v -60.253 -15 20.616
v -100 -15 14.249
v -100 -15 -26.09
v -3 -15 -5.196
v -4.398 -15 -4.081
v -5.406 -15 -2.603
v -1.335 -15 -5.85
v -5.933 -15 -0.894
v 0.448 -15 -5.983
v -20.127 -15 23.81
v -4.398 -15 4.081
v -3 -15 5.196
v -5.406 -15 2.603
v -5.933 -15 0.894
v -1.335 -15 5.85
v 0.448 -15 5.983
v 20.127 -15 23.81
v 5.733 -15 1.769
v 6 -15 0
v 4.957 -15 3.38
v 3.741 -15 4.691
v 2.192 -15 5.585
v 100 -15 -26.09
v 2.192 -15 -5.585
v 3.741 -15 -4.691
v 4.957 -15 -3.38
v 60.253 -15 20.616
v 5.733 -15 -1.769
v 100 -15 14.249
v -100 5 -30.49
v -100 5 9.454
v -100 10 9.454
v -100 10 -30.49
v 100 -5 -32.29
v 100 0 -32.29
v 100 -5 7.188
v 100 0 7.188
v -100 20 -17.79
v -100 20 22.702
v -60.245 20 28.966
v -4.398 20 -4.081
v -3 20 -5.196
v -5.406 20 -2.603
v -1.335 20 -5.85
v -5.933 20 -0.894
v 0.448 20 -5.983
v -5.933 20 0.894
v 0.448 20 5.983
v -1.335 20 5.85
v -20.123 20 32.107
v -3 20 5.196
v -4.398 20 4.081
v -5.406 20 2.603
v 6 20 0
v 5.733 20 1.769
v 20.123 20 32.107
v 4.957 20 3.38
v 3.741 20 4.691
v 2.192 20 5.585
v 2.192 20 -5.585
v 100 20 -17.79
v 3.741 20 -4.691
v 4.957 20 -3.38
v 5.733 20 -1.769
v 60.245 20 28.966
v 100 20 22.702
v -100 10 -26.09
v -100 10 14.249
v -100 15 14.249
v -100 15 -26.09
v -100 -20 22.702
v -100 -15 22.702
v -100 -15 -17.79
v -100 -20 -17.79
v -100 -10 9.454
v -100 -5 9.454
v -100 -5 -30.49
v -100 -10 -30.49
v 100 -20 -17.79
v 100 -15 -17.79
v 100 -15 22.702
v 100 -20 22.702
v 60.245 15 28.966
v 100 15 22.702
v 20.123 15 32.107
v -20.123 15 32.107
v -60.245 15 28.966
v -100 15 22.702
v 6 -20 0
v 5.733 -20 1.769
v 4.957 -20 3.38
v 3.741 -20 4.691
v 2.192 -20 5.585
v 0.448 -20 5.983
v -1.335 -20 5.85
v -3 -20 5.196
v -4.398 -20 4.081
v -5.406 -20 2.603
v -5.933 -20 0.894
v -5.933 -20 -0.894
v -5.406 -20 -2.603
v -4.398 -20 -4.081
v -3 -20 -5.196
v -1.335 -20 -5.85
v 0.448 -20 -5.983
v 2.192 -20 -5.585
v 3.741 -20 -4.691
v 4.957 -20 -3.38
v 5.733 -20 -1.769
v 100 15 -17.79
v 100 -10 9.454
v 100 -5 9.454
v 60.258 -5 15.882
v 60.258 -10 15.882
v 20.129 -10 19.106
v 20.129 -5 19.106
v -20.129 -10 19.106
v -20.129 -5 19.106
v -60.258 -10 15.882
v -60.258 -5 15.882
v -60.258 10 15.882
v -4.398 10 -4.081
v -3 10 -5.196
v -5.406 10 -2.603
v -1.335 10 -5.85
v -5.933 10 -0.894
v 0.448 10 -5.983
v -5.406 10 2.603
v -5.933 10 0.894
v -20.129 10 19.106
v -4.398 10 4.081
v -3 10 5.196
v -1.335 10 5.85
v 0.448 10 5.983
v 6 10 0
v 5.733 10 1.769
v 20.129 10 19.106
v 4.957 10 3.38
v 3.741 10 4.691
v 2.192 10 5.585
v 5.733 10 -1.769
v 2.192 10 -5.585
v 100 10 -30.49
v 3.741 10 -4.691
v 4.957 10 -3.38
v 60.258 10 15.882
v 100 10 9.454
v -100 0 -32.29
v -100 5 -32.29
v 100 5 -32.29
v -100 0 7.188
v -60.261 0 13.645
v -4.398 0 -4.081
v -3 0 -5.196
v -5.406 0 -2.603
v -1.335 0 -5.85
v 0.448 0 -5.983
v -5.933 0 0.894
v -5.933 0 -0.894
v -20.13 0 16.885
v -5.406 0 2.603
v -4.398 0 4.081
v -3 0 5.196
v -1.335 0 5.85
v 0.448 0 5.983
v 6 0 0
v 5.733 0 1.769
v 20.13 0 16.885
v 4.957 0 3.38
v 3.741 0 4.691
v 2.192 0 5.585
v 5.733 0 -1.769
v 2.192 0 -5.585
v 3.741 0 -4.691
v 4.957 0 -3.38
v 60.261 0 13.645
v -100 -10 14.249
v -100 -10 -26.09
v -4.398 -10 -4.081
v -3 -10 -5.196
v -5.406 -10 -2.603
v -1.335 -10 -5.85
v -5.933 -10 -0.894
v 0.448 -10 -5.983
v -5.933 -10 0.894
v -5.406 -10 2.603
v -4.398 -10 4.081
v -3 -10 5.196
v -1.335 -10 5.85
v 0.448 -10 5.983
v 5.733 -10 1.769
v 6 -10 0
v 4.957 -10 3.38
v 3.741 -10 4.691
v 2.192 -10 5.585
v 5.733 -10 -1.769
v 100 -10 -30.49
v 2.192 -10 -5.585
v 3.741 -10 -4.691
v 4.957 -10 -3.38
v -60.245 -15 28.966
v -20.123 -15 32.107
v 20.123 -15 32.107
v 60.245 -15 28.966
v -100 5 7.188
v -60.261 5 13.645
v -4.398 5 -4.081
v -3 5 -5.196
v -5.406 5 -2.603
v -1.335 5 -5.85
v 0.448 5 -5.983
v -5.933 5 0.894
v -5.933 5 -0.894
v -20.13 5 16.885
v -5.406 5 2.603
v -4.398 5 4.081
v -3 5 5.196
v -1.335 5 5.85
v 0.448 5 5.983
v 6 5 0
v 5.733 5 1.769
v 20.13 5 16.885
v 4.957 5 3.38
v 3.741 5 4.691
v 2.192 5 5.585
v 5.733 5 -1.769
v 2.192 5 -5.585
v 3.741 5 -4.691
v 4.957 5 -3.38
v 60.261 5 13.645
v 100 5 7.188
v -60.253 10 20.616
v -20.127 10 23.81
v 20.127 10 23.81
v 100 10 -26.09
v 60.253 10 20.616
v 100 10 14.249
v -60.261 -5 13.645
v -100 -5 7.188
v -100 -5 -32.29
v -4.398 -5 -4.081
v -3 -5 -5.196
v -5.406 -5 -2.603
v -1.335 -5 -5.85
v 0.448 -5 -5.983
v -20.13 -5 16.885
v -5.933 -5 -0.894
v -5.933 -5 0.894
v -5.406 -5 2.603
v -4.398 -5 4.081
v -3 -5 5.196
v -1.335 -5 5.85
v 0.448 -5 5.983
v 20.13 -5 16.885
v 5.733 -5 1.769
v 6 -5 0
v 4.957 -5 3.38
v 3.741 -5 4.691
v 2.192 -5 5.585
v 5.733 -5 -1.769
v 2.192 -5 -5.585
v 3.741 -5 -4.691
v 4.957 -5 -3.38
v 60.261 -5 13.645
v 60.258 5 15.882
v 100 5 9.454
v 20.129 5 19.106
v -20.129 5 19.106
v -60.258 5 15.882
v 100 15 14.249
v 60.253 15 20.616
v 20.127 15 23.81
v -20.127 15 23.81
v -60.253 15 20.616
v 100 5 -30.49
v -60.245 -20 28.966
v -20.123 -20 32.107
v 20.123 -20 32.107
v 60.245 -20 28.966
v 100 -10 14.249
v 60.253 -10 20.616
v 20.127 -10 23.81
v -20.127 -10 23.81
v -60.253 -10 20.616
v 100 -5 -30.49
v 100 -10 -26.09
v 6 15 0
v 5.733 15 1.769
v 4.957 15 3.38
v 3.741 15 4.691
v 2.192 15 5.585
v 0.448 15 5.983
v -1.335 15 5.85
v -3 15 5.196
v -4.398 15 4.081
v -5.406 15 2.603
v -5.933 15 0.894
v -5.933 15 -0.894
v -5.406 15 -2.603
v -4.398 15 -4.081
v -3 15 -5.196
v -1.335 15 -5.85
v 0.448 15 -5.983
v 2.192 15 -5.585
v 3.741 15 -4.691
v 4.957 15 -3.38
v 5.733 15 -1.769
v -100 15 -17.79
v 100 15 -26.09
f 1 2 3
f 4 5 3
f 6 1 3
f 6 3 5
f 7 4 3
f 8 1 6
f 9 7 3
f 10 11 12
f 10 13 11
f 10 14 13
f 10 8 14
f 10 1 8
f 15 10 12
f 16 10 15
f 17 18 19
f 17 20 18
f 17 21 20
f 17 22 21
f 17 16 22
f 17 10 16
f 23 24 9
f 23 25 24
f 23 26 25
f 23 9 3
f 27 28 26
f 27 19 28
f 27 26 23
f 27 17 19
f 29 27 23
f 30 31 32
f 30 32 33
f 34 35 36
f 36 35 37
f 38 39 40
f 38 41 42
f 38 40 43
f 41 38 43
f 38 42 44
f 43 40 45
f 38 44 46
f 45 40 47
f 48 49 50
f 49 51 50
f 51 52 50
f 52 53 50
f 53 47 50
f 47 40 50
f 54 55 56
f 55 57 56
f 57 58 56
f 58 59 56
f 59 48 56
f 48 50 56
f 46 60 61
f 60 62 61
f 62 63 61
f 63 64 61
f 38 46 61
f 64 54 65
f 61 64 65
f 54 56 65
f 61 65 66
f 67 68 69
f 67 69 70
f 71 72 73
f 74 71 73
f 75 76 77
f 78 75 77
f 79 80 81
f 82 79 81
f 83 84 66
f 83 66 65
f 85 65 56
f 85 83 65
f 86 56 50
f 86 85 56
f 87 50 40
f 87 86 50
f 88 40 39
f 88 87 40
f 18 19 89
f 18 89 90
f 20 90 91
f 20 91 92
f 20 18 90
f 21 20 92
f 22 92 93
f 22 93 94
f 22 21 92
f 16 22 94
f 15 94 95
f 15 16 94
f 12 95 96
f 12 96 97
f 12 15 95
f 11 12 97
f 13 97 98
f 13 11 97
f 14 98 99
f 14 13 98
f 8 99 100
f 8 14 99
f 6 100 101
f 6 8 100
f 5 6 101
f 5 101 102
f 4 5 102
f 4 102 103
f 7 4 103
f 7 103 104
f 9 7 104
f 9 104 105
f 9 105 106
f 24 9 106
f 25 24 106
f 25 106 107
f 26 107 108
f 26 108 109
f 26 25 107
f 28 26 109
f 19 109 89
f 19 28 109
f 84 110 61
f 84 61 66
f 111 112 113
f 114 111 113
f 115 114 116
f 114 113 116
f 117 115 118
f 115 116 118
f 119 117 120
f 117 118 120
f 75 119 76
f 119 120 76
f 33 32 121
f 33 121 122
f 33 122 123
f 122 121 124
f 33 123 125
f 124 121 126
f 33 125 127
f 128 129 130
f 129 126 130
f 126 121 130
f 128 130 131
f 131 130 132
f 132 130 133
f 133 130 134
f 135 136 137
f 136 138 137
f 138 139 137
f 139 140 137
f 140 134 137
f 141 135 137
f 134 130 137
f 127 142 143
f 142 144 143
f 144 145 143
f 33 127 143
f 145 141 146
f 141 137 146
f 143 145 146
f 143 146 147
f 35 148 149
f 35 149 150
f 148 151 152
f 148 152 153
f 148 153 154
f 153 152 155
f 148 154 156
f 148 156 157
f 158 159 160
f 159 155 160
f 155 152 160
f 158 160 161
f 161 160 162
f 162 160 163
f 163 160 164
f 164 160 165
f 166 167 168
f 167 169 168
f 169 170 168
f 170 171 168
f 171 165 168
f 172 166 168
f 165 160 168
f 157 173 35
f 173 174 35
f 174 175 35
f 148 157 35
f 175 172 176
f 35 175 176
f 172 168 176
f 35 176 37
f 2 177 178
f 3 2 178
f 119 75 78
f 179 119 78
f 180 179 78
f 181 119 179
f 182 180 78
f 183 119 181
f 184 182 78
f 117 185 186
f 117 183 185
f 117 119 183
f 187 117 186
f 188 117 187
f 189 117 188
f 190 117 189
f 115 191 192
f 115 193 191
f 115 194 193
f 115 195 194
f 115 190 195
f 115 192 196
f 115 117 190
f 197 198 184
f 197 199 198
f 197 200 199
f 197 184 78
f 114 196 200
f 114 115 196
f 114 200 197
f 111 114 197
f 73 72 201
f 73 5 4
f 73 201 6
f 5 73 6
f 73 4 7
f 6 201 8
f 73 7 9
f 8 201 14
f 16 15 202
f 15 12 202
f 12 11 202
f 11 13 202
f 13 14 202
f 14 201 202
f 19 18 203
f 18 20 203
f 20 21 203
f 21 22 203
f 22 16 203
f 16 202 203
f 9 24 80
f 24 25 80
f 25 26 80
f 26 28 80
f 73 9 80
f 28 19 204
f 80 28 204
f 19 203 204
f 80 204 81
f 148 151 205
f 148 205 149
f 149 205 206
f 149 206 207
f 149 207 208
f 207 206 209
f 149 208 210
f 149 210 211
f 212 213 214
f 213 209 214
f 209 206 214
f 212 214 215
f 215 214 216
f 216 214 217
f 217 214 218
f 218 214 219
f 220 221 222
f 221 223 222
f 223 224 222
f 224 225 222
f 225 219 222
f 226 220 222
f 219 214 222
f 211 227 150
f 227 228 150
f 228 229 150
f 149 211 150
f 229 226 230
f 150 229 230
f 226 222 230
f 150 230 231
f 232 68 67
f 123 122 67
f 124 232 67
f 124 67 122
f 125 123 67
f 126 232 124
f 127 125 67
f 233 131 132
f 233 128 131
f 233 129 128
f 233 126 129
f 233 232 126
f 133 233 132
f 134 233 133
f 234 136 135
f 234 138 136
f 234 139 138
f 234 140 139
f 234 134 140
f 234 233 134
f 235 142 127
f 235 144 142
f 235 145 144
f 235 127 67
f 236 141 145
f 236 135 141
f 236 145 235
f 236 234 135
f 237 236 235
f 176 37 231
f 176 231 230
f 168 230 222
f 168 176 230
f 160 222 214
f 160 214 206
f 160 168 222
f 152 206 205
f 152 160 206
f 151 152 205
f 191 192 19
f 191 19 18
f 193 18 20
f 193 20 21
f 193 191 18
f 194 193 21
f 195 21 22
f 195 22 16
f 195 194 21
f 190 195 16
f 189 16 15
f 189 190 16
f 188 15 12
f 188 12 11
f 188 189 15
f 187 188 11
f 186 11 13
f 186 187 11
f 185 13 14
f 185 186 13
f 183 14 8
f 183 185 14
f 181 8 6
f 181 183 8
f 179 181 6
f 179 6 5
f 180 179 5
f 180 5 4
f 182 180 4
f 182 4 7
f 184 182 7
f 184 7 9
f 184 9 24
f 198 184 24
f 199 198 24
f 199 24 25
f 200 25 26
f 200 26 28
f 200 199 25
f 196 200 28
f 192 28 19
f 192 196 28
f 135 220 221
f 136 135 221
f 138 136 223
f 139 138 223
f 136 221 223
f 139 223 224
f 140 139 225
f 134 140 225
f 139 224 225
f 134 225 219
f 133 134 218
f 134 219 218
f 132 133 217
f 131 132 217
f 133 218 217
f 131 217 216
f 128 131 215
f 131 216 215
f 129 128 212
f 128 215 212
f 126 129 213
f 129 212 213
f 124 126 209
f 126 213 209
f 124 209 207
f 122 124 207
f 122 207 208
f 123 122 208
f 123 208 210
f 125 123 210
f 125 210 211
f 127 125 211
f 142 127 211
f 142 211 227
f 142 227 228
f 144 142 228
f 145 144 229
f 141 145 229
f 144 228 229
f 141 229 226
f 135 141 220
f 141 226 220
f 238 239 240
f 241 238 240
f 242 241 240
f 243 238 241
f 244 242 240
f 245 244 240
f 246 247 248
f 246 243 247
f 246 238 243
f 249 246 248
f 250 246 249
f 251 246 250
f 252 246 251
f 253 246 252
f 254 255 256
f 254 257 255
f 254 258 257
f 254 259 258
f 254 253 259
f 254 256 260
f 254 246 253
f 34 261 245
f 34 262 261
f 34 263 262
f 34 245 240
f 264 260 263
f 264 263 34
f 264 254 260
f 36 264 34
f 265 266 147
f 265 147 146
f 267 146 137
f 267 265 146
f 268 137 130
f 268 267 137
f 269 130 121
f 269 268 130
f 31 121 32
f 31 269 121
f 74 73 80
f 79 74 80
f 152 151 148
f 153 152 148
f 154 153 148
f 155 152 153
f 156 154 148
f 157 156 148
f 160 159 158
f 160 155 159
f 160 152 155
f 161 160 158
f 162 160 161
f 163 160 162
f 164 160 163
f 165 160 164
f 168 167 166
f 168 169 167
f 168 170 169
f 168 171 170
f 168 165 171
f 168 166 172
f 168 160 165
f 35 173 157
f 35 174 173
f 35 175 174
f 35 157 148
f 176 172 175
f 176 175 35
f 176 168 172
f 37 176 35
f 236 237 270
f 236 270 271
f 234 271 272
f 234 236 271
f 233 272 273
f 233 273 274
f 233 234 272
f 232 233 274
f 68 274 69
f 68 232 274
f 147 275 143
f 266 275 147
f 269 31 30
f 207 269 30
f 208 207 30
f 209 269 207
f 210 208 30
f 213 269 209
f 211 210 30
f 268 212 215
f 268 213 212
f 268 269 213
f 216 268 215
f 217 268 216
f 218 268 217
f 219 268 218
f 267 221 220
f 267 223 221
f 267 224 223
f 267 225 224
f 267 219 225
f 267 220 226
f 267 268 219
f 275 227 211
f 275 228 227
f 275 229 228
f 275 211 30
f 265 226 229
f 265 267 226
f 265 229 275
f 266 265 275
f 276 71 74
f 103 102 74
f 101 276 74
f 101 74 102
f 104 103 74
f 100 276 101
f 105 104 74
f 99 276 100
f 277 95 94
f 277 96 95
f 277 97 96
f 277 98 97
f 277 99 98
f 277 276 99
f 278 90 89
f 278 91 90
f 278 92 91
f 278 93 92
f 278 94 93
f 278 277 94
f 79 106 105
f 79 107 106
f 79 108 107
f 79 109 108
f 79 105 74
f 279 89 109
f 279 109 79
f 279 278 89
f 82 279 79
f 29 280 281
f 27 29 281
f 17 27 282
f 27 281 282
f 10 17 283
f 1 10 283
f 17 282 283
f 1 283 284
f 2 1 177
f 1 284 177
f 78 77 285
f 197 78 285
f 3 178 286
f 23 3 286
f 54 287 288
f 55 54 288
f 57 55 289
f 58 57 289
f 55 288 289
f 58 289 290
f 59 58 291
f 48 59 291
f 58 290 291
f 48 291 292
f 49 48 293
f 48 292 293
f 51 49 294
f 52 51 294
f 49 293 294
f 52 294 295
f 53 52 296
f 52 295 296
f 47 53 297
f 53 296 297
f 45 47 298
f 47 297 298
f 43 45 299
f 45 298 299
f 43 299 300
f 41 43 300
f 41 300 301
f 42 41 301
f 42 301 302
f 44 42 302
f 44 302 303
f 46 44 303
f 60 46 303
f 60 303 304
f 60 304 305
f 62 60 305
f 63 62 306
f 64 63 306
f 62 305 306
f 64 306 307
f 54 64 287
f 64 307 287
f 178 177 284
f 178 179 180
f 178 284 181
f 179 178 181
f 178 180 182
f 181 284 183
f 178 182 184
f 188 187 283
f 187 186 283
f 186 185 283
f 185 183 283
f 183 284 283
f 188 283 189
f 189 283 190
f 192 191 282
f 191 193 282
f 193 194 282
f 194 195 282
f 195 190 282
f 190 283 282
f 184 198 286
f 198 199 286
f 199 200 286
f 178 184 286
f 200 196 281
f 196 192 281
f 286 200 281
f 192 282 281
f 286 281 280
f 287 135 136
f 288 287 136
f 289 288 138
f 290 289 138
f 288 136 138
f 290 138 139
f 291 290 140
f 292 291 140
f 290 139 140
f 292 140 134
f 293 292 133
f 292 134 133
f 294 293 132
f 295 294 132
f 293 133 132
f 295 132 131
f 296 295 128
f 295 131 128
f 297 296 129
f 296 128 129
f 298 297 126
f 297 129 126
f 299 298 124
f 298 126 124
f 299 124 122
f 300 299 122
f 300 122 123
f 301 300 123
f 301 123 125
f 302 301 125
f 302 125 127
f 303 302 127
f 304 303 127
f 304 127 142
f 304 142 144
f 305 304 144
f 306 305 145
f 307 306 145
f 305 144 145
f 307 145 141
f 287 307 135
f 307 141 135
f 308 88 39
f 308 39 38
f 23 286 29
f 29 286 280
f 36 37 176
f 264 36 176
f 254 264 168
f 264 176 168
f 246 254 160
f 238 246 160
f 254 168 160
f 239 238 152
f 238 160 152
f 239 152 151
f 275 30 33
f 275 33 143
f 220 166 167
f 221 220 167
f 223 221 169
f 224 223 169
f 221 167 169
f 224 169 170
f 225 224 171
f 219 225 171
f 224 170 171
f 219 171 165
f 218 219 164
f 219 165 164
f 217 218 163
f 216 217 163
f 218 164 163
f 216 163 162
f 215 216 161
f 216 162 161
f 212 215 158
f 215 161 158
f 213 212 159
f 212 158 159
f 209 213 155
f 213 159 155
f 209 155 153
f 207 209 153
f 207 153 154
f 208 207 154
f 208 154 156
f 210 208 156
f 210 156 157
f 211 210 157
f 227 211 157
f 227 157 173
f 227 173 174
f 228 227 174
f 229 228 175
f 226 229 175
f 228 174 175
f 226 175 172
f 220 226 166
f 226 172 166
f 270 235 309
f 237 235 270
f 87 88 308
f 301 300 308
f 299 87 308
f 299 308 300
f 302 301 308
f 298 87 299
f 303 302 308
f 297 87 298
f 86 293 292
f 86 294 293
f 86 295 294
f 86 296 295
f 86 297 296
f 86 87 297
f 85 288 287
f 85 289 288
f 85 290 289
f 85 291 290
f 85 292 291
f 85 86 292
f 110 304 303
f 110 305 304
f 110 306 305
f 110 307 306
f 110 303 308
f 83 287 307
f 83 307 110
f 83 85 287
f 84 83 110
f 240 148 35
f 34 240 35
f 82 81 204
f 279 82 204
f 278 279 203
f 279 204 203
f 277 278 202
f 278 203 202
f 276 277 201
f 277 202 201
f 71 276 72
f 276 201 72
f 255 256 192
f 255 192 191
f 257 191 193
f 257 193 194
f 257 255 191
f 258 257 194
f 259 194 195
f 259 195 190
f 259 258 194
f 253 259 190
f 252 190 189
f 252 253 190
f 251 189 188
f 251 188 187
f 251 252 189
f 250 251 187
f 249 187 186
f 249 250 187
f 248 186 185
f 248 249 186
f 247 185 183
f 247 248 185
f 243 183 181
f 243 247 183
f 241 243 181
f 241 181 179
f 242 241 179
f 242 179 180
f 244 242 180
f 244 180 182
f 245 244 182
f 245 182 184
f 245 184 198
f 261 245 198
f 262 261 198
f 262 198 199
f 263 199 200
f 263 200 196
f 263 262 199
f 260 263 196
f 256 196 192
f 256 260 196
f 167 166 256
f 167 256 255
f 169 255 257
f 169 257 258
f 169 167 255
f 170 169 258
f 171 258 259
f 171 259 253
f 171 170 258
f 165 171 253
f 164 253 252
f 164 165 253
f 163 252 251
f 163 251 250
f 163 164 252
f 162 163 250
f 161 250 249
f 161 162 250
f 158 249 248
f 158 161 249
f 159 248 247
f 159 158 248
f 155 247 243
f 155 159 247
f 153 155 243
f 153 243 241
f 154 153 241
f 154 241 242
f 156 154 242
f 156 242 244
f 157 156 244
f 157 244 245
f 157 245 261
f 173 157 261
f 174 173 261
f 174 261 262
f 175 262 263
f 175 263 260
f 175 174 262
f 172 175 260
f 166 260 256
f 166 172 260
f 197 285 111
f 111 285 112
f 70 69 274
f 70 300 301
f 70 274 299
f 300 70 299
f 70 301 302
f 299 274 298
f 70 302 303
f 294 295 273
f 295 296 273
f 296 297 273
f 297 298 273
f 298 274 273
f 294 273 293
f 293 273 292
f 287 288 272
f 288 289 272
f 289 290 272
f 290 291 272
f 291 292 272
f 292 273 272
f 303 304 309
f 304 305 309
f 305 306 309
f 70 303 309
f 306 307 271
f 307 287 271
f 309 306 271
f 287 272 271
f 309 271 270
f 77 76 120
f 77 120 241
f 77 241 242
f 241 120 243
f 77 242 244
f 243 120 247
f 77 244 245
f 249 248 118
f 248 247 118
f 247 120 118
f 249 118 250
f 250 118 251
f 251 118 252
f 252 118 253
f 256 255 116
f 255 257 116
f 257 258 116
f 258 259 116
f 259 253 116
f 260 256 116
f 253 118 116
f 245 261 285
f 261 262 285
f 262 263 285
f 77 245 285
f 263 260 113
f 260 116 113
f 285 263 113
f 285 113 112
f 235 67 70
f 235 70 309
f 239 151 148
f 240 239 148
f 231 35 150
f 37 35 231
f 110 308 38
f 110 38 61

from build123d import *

# Parameters (mm, degrees)
F0_R     = 6
F1_DEPTH = 5
F2_R     = 6
F3_DEPTH = 5
F4_R     = 6
F5_DEPTH = 5
F6_R     = 6
F7_DEPTH = 5


with BuildPart() as f1:
    # F0 (on Front) → F1 (new body)
    with BuildSketch(Plane.XZ):
        with BuildLine():
            Line((-100, 7.187949), (-100, -32.29))
            Line((-100, -32.29), (100, -32.29))
            Line((100, -32.29), (100, 7.187949))
            ThreePointArc((100, 7.187949), (0, 17.29), (-100, 7.187949))
        make_face()
        Circle(F0_R, mode=Mode.SUBTRACT)
    extrude(amount=F1_DEPTH)


with BuildPart() as f3:
    # F2 (on face) → F3 (new body)
    with BuildSketch(Plane.XZ.offset(5)):
        with BuildLine():
            Line((-100, -30.49), (100, -30.49))
            Line((100, -30.49), (100, 9.453518))
            ThreePointArc((100, 9.453518), (0, 19.51), (-100, 9.453518))
            Line((-100, 9.453518), (-100, -30.49))
        make_face()
        Circle(F2_R, mode=Mode.SUBTRACT)
    extrude(amount=F3_DEPTH)


with BuildPart() as f5:
    # F4 (on face) → F5 (new body)
    with BuildSketch(Plane.XZ.offset(10)):
        with BuildLine():
            Line((-100, -26.09), (100, -26.09))
            Line((100, -26.09), (100, 14.248637))
            ThreePointArc((100, 14.248637), (0, 24.21), (-100, 14.248637))
            Line((-100, 14.248637), (-100, -26.09))
        make_face()
        Circle(F4_R, mode=Mode.SUBTRACT)
    extrude(amount=F5_DEPTH)


with BuildPart() as f7:
    # F6 (on face) → F7 (new body)
    with BuildSketch(Plane.XZ.offset(15)):
        with BuildLine():
            Line((-100, -17.79), (100, -17.79))
            Line((100, -17.79), (100, 22.702054))
            ThreePointArc((100, 22.702054), (0, 32.5), (-100, 22.702054))
            Line((-100, 22.702054), (-100, -17.79))
        make_face()
        Circle(F6_R, mode=Mode.SUBTRACT)
    extrude(amount=F7_DEPTH)


with BuildPart() as f8_1:
    # F8: instance of F1
    add(f1.part.mirror(Plane.XZ))


with BuildPart() as f8_2:
    # F8: instance of F3
    add(f3.part.mirror(Plane.XZ))


with BuildPart() as f8_3:
    # F8: instance of F5
    add(f5.part.mirror(Plane.XZ))


with BuildPart() as f8_4:
    # F8: instance of F7
    add(f7.part.mirror(Plane.XZ))


solid = Compound([f1.part, f3.part, f5.part, f7.part, f8_1.part, f8_2.part, f8_3.part, f8_4.part])
